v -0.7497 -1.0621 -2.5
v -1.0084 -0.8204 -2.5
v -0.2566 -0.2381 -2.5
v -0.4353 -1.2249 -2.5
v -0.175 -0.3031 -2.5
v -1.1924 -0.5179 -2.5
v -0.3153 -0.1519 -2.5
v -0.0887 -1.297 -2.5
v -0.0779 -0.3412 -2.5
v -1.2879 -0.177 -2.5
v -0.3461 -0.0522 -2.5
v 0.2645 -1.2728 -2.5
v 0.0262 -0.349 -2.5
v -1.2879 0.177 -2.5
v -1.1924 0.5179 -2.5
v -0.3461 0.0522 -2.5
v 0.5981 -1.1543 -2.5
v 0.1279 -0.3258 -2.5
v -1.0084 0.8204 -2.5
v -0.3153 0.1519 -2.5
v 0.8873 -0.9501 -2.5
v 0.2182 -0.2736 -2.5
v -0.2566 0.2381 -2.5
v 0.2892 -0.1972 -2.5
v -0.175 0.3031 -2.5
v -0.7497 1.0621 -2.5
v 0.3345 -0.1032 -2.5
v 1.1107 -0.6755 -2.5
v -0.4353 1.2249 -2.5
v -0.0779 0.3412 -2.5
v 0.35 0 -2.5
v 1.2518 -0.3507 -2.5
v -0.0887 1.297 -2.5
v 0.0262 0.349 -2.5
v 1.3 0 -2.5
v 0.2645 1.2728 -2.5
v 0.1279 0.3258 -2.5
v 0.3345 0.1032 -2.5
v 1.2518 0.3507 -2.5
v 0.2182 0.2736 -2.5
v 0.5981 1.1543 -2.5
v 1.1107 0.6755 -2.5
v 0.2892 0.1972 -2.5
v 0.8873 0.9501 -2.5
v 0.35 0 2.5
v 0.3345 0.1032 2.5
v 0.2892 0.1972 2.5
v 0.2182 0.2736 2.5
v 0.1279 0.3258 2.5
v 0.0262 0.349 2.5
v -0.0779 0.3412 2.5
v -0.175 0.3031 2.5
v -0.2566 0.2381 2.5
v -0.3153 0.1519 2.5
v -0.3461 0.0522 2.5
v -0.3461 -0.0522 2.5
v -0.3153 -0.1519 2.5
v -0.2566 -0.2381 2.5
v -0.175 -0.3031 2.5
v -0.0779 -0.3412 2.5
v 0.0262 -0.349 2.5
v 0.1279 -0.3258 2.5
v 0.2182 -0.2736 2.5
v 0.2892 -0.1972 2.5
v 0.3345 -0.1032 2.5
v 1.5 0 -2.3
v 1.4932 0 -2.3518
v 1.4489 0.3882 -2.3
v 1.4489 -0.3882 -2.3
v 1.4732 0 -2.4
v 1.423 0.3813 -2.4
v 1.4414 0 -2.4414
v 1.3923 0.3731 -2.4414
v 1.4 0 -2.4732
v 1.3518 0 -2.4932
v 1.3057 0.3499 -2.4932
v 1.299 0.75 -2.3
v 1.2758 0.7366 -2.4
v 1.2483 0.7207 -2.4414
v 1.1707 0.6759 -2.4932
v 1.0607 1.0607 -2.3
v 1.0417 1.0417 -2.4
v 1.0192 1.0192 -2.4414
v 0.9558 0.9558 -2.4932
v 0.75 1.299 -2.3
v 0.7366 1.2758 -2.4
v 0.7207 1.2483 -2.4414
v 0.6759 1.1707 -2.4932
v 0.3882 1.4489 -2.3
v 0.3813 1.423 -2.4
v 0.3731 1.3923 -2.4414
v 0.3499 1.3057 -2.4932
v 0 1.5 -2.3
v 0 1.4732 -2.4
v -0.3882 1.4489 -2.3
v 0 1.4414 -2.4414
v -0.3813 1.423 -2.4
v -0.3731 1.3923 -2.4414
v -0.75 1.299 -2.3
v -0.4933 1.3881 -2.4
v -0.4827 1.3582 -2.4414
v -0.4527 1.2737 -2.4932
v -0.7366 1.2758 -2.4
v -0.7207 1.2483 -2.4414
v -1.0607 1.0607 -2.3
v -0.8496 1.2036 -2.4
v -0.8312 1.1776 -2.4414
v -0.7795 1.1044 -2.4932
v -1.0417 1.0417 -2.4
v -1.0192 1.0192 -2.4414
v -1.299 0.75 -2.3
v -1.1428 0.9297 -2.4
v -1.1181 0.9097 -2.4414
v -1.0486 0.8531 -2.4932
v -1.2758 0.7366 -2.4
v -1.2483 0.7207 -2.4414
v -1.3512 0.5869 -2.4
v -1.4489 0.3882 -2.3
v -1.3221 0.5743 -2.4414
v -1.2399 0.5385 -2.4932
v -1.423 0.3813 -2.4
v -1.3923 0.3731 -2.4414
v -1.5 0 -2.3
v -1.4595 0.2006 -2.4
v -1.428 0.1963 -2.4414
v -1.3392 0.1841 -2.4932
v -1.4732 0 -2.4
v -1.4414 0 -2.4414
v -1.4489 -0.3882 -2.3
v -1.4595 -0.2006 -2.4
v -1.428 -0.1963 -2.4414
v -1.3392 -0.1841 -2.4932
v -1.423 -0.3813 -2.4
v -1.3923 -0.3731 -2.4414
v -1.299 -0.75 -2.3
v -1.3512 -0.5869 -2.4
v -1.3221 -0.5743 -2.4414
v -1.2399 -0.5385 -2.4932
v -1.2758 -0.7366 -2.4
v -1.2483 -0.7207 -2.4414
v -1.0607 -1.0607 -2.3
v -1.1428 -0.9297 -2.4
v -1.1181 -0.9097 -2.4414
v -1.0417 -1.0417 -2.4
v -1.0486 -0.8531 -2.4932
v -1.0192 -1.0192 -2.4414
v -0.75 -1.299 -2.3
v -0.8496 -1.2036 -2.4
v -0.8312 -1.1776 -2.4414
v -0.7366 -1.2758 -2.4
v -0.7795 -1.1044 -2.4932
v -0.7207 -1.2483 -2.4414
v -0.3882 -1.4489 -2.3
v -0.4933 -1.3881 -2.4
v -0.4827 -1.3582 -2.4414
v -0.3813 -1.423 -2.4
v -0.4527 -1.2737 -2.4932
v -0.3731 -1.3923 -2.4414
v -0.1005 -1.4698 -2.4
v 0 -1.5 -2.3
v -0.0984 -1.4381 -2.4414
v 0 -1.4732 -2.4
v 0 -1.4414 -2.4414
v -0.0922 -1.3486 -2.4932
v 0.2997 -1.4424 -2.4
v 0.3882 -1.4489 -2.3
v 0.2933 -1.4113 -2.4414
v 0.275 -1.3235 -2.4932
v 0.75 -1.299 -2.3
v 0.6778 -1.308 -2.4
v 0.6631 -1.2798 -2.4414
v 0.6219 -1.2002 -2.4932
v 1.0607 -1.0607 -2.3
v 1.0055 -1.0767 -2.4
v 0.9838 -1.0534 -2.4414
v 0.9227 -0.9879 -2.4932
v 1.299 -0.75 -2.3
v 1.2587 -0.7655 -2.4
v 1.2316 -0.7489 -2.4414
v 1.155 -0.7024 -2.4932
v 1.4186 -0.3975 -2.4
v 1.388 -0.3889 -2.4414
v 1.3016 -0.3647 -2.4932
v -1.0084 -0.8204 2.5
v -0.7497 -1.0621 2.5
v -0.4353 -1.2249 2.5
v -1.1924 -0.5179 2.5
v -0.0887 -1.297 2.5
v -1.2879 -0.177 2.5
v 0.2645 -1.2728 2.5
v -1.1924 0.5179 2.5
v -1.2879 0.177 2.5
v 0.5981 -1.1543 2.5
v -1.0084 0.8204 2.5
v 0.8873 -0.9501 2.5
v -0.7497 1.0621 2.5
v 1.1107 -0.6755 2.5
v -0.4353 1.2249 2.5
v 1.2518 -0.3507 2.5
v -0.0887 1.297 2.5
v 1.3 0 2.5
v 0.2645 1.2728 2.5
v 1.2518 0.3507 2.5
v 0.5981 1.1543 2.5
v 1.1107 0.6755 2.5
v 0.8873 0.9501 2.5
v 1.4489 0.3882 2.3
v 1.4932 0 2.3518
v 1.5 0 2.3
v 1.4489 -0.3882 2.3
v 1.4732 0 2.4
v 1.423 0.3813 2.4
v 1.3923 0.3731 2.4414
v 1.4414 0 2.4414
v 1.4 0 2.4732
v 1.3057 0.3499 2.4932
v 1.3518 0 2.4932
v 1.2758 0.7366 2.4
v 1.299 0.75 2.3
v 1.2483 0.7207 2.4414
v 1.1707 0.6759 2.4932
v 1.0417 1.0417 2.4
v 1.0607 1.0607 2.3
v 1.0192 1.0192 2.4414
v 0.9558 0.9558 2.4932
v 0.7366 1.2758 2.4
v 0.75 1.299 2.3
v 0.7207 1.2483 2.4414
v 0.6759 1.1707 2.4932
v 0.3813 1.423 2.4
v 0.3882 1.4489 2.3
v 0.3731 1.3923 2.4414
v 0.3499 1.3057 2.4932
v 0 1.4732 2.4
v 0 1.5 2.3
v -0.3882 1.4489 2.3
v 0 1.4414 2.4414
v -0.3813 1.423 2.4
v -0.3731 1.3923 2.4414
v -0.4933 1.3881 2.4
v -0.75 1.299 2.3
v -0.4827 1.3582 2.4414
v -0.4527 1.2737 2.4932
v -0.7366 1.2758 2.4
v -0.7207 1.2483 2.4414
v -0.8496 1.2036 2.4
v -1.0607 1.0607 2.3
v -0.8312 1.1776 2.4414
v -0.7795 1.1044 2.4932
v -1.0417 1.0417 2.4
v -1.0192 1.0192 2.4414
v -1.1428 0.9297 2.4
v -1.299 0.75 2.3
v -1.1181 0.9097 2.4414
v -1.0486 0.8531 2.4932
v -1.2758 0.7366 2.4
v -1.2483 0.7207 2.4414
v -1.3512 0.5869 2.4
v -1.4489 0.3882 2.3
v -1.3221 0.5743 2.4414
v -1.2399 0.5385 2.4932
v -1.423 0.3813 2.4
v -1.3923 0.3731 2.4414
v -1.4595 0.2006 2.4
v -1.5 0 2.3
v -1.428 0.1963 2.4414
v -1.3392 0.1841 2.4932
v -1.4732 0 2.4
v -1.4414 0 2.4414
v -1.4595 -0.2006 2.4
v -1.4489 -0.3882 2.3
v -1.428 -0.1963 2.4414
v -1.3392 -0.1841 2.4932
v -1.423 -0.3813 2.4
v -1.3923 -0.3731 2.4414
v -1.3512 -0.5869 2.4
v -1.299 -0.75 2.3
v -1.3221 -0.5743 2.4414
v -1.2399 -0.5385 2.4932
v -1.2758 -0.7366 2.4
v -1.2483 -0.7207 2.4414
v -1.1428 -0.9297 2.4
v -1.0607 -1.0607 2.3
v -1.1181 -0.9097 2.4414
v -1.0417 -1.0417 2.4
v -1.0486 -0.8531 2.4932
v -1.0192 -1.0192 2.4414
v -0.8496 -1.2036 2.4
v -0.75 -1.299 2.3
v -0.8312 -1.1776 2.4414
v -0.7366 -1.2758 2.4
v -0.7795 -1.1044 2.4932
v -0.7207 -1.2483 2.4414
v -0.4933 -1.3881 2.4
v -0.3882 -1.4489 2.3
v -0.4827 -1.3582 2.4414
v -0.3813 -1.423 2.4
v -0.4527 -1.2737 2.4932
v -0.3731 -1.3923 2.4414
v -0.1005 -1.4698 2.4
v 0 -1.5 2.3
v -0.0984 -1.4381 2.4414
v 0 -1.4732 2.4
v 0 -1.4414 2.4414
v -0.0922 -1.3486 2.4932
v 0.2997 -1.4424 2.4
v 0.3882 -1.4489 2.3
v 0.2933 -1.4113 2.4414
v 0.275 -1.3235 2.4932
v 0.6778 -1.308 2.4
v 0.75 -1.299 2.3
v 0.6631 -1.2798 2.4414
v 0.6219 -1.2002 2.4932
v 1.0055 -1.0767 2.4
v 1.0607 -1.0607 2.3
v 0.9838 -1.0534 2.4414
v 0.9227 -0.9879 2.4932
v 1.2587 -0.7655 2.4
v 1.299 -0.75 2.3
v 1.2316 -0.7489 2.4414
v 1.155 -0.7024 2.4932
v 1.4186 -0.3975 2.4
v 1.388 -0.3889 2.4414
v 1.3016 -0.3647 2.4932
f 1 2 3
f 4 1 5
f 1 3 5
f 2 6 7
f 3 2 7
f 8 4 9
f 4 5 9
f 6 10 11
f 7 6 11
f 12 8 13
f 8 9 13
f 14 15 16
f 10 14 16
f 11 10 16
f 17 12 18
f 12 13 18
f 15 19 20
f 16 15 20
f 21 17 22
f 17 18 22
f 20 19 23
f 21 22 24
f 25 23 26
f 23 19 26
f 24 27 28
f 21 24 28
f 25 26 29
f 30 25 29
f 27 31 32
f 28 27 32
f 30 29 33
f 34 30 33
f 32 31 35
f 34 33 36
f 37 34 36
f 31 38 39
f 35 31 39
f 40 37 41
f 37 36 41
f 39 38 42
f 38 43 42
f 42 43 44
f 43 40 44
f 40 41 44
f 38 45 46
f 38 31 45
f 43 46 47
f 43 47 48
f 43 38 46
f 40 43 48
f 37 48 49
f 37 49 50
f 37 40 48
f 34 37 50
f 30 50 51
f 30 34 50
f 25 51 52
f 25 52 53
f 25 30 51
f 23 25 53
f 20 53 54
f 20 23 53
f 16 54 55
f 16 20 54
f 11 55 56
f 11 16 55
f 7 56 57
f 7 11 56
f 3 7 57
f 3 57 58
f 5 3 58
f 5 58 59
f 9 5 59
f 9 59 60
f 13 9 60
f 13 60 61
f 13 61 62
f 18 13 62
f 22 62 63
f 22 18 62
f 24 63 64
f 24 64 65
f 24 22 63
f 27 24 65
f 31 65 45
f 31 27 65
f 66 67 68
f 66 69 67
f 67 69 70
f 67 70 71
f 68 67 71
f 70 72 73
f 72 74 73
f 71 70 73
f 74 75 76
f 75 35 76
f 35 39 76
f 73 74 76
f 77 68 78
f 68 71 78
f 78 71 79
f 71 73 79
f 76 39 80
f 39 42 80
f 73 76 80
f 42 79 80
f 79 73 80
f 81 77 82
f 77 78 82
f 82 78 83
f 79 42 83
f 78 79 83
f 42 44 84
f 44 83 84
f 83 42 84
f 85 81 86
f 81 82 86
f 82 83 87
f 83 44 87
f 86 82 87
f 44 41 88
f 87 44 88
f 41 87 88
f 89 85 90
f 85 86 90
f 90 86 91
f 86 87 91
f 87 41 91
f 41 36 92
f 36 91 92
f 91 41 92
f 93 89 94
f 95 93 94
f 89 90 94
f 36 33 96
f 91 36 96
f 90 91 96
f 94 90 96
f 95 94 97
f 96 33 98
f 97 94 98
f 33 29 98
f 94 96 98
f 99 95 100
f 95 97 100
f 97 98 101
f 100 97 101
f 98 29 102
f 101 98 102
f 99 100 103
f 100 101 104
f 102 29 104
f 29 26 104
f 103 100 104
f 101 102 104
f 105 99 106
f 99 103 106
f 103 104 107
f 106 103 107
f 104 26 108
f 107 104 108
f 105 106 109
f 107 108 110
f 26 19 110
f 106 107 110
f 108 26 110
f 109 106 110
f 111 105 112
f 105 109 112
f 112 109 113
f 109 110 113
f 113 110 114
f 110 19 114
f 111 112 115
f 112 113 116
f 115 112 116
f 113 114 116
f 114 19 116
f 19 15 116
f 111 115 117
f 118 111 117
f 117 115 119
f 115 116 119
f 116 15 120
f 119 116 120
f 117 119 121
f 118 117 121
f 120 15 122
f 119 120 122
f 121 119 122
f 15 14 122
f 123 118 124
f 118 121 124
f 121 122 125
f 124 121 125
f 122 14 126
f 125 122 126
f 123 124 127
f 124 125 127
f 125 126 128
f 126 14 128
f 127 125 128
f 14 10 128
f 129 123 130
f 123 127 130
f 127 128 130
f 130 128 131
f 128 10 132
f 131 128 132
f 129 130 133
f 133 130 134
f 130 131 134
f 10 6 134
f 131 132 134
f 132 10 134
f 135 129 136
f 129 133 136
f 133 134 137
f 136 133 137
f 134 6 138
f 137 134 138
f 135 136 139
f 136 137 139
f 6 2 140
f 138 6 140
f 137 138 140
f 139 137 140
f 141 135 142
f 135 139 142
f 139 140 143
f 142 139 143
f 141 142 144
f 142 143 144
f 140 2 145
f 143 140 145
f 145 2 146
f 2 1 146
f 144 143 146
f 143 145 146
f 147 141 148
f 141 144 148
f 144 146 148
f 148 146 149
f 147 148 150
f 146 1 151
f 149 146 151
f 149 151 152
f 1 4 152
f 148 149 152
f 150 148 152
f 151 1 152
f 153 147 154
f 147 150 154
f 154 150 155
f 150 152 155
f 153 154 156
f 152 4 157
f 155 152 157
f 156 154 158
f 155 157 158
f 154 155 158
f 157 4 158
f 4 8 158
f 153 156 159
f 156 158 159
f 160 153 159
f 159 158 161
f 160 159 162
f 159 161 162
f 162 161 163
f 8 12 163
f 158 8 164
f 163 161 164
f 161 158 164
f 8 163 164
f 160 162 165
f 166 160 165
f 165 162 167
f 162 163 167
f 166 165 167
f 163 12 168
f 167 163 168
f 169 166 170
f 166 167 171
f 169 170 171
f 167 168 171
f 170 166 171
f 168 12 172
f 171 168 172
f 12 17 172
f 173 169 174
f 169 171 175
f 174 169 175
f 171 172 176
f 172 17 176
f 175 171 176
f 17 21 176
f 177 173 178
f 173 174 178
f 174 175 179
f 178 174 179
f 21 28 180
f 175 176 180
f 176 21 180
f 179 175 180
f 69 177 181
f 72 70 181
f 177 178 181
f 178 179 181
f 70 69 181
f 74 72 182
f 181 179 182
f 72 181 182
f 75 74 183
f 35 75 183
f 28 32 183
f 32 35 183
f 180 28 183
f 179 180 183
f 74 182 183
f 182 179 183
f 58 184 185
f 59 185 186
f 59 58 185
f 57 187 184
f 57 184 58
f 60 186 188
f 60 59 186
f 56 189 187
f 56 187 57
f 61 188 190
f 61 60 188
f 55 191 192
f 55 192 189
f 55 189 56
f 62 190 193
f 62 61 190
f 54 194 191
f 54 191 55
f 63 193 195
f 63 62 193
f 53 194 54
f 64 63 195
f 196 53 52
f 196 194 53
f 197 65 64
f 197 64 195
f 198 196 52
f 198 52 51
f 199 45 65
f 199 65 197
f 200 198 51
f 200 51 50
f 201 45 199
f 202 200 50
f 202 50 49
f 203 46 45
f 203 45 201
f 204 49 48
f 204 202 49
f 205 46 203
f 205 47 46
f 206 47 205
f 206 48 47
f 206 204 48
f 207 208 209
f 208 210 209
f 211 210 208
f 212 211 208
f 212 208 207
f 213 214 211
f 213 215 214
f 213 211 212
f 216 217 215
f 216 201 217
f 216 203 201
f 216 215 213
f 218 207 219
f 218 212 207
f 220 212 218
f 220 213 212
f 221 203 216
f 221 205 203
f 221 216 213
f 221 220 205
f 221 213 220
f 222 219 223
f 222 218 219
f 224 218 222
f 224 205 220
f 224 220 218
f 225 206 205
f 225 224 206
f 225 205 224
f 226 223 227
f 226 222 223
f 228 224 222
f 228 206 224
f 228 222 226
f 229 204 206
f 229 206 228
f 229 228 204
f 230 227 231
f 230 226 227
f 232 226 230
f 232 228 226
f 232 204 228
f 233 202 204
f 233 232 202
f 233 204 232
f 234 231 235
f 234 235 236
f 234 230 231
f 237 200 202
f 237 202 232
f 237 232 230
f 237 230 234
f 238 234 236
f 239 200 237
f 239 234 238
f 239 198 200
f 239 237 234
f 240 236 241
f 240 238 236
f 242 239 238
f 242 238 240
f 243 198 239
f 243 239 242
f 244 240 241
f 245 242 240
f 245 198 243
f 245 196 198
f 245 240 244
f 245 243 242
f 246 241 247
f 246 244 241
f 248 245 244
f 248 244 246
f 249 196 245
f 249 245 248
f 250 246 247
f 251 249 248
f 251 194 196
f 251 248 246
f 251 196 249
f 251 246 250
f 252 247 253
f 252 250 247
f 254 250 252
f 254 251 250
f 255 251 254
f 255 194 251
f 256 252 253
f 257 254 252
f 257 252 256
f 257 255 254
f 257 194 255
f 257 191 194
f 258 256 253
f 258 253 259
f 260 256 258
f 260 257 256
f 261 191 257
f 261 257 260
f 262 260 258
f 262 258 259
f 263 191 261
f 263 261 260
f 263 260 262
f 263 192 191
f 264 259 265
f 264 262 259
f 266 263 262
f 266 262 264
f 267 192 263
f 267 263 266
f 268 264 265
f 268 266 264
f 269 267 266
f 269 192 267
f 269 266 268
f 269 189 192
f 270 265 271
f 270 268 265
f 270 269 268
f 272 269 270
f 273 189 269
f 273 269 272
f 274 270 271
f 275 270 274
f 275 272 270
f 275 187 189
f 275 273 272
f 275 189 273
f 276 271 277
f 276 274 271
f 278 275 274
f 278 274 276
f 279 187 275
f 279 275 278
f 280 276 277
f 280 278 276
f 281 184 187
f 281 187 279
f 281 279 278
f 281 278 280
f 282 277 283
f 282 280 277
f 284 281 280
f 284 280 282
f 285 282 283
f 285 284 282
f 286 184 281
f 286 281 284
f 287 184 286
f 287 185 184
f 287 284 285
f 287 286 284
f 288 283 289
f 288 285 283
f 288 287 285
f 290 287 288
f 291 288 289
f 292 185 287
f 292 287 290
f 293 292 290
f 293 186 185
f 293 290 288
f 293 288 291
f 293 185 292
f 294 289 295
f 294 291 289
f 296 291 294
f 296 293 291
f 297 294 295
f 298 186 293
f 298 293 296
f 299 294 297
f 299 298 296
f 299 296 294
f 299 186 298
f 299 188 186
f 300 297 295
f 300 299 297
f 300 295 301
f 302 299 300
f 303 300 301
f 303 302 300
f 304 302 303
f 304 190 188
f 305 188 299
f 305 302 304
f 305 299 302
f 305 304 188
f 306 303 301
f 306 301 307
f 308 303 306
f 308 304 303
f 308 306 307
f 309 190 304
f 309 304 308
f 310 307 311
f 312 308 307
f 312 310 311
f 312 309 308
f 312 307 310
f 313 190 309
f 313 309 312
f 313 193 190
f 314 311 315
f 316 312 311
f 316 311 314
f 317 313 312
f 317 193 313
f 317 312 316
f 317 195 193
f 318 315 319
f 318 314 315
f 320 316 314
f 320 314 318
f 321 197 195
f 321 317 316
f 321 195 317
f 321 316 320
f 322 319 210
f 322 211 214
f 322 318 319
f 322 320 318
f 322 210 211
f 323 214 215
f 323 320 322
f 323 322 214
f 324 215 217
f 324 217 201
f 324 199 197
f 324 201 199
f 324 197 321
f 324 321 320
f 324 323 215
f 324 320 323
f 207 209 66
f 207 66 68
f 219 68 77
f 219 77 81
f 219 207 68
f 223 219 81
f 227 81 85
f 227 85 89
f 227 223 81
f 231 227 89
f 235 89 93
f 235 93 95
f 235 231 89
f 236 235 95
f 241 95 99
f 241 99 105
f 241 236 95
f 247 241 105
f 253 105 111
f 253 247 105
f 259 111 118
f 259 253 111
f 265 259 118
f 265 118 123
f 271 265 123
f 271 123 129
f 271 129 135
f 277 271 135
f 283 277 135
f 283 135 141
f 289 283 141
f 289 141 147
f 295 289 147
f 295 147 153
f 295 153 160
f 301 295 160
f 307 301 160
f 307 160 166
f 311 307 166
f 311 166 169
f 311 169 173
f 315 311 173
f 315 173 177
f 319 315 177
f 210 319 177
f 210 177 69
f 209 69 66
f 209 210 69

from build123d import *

# Parameters (mm, degrees)
SKETCH1_R           = 1.5
SKETCH1_R_2         = 0.35
BOSS_EXTRUDE1_DEPTH = 2.5
FILLET1_R           = 0.2
FILLET2_R           = 0.2


with BuildPart() as part:
    # Sketch1 → Boss-Extrude1 (new, symmetric)
    with BuildSketch(Plane.XY):
        Circle(SKETCH1_R)
        Circle(SKETCH1_R_2, mode=Mode.SUBTRACT)
    extrude(amount=BOSS_EXTRUDE1_DEPTH, both=True)

    # Fillet1
    fillet1_edges = [part.edges().sort_by_distance(p)[0] for p in [
        (-1.5, 0, 2.5),
    ]]
    fillet(fillet1_edges, radius=FILLET1_R)

    # Fillet2
    fillet2_edges = [part.edges().sort_by_distance(p)[0] for p in [
        (-1.5, 0, -2.5),
    ]]
    fillet(fillet2_edges, radius=FILLET2_R)


solid = part.part
